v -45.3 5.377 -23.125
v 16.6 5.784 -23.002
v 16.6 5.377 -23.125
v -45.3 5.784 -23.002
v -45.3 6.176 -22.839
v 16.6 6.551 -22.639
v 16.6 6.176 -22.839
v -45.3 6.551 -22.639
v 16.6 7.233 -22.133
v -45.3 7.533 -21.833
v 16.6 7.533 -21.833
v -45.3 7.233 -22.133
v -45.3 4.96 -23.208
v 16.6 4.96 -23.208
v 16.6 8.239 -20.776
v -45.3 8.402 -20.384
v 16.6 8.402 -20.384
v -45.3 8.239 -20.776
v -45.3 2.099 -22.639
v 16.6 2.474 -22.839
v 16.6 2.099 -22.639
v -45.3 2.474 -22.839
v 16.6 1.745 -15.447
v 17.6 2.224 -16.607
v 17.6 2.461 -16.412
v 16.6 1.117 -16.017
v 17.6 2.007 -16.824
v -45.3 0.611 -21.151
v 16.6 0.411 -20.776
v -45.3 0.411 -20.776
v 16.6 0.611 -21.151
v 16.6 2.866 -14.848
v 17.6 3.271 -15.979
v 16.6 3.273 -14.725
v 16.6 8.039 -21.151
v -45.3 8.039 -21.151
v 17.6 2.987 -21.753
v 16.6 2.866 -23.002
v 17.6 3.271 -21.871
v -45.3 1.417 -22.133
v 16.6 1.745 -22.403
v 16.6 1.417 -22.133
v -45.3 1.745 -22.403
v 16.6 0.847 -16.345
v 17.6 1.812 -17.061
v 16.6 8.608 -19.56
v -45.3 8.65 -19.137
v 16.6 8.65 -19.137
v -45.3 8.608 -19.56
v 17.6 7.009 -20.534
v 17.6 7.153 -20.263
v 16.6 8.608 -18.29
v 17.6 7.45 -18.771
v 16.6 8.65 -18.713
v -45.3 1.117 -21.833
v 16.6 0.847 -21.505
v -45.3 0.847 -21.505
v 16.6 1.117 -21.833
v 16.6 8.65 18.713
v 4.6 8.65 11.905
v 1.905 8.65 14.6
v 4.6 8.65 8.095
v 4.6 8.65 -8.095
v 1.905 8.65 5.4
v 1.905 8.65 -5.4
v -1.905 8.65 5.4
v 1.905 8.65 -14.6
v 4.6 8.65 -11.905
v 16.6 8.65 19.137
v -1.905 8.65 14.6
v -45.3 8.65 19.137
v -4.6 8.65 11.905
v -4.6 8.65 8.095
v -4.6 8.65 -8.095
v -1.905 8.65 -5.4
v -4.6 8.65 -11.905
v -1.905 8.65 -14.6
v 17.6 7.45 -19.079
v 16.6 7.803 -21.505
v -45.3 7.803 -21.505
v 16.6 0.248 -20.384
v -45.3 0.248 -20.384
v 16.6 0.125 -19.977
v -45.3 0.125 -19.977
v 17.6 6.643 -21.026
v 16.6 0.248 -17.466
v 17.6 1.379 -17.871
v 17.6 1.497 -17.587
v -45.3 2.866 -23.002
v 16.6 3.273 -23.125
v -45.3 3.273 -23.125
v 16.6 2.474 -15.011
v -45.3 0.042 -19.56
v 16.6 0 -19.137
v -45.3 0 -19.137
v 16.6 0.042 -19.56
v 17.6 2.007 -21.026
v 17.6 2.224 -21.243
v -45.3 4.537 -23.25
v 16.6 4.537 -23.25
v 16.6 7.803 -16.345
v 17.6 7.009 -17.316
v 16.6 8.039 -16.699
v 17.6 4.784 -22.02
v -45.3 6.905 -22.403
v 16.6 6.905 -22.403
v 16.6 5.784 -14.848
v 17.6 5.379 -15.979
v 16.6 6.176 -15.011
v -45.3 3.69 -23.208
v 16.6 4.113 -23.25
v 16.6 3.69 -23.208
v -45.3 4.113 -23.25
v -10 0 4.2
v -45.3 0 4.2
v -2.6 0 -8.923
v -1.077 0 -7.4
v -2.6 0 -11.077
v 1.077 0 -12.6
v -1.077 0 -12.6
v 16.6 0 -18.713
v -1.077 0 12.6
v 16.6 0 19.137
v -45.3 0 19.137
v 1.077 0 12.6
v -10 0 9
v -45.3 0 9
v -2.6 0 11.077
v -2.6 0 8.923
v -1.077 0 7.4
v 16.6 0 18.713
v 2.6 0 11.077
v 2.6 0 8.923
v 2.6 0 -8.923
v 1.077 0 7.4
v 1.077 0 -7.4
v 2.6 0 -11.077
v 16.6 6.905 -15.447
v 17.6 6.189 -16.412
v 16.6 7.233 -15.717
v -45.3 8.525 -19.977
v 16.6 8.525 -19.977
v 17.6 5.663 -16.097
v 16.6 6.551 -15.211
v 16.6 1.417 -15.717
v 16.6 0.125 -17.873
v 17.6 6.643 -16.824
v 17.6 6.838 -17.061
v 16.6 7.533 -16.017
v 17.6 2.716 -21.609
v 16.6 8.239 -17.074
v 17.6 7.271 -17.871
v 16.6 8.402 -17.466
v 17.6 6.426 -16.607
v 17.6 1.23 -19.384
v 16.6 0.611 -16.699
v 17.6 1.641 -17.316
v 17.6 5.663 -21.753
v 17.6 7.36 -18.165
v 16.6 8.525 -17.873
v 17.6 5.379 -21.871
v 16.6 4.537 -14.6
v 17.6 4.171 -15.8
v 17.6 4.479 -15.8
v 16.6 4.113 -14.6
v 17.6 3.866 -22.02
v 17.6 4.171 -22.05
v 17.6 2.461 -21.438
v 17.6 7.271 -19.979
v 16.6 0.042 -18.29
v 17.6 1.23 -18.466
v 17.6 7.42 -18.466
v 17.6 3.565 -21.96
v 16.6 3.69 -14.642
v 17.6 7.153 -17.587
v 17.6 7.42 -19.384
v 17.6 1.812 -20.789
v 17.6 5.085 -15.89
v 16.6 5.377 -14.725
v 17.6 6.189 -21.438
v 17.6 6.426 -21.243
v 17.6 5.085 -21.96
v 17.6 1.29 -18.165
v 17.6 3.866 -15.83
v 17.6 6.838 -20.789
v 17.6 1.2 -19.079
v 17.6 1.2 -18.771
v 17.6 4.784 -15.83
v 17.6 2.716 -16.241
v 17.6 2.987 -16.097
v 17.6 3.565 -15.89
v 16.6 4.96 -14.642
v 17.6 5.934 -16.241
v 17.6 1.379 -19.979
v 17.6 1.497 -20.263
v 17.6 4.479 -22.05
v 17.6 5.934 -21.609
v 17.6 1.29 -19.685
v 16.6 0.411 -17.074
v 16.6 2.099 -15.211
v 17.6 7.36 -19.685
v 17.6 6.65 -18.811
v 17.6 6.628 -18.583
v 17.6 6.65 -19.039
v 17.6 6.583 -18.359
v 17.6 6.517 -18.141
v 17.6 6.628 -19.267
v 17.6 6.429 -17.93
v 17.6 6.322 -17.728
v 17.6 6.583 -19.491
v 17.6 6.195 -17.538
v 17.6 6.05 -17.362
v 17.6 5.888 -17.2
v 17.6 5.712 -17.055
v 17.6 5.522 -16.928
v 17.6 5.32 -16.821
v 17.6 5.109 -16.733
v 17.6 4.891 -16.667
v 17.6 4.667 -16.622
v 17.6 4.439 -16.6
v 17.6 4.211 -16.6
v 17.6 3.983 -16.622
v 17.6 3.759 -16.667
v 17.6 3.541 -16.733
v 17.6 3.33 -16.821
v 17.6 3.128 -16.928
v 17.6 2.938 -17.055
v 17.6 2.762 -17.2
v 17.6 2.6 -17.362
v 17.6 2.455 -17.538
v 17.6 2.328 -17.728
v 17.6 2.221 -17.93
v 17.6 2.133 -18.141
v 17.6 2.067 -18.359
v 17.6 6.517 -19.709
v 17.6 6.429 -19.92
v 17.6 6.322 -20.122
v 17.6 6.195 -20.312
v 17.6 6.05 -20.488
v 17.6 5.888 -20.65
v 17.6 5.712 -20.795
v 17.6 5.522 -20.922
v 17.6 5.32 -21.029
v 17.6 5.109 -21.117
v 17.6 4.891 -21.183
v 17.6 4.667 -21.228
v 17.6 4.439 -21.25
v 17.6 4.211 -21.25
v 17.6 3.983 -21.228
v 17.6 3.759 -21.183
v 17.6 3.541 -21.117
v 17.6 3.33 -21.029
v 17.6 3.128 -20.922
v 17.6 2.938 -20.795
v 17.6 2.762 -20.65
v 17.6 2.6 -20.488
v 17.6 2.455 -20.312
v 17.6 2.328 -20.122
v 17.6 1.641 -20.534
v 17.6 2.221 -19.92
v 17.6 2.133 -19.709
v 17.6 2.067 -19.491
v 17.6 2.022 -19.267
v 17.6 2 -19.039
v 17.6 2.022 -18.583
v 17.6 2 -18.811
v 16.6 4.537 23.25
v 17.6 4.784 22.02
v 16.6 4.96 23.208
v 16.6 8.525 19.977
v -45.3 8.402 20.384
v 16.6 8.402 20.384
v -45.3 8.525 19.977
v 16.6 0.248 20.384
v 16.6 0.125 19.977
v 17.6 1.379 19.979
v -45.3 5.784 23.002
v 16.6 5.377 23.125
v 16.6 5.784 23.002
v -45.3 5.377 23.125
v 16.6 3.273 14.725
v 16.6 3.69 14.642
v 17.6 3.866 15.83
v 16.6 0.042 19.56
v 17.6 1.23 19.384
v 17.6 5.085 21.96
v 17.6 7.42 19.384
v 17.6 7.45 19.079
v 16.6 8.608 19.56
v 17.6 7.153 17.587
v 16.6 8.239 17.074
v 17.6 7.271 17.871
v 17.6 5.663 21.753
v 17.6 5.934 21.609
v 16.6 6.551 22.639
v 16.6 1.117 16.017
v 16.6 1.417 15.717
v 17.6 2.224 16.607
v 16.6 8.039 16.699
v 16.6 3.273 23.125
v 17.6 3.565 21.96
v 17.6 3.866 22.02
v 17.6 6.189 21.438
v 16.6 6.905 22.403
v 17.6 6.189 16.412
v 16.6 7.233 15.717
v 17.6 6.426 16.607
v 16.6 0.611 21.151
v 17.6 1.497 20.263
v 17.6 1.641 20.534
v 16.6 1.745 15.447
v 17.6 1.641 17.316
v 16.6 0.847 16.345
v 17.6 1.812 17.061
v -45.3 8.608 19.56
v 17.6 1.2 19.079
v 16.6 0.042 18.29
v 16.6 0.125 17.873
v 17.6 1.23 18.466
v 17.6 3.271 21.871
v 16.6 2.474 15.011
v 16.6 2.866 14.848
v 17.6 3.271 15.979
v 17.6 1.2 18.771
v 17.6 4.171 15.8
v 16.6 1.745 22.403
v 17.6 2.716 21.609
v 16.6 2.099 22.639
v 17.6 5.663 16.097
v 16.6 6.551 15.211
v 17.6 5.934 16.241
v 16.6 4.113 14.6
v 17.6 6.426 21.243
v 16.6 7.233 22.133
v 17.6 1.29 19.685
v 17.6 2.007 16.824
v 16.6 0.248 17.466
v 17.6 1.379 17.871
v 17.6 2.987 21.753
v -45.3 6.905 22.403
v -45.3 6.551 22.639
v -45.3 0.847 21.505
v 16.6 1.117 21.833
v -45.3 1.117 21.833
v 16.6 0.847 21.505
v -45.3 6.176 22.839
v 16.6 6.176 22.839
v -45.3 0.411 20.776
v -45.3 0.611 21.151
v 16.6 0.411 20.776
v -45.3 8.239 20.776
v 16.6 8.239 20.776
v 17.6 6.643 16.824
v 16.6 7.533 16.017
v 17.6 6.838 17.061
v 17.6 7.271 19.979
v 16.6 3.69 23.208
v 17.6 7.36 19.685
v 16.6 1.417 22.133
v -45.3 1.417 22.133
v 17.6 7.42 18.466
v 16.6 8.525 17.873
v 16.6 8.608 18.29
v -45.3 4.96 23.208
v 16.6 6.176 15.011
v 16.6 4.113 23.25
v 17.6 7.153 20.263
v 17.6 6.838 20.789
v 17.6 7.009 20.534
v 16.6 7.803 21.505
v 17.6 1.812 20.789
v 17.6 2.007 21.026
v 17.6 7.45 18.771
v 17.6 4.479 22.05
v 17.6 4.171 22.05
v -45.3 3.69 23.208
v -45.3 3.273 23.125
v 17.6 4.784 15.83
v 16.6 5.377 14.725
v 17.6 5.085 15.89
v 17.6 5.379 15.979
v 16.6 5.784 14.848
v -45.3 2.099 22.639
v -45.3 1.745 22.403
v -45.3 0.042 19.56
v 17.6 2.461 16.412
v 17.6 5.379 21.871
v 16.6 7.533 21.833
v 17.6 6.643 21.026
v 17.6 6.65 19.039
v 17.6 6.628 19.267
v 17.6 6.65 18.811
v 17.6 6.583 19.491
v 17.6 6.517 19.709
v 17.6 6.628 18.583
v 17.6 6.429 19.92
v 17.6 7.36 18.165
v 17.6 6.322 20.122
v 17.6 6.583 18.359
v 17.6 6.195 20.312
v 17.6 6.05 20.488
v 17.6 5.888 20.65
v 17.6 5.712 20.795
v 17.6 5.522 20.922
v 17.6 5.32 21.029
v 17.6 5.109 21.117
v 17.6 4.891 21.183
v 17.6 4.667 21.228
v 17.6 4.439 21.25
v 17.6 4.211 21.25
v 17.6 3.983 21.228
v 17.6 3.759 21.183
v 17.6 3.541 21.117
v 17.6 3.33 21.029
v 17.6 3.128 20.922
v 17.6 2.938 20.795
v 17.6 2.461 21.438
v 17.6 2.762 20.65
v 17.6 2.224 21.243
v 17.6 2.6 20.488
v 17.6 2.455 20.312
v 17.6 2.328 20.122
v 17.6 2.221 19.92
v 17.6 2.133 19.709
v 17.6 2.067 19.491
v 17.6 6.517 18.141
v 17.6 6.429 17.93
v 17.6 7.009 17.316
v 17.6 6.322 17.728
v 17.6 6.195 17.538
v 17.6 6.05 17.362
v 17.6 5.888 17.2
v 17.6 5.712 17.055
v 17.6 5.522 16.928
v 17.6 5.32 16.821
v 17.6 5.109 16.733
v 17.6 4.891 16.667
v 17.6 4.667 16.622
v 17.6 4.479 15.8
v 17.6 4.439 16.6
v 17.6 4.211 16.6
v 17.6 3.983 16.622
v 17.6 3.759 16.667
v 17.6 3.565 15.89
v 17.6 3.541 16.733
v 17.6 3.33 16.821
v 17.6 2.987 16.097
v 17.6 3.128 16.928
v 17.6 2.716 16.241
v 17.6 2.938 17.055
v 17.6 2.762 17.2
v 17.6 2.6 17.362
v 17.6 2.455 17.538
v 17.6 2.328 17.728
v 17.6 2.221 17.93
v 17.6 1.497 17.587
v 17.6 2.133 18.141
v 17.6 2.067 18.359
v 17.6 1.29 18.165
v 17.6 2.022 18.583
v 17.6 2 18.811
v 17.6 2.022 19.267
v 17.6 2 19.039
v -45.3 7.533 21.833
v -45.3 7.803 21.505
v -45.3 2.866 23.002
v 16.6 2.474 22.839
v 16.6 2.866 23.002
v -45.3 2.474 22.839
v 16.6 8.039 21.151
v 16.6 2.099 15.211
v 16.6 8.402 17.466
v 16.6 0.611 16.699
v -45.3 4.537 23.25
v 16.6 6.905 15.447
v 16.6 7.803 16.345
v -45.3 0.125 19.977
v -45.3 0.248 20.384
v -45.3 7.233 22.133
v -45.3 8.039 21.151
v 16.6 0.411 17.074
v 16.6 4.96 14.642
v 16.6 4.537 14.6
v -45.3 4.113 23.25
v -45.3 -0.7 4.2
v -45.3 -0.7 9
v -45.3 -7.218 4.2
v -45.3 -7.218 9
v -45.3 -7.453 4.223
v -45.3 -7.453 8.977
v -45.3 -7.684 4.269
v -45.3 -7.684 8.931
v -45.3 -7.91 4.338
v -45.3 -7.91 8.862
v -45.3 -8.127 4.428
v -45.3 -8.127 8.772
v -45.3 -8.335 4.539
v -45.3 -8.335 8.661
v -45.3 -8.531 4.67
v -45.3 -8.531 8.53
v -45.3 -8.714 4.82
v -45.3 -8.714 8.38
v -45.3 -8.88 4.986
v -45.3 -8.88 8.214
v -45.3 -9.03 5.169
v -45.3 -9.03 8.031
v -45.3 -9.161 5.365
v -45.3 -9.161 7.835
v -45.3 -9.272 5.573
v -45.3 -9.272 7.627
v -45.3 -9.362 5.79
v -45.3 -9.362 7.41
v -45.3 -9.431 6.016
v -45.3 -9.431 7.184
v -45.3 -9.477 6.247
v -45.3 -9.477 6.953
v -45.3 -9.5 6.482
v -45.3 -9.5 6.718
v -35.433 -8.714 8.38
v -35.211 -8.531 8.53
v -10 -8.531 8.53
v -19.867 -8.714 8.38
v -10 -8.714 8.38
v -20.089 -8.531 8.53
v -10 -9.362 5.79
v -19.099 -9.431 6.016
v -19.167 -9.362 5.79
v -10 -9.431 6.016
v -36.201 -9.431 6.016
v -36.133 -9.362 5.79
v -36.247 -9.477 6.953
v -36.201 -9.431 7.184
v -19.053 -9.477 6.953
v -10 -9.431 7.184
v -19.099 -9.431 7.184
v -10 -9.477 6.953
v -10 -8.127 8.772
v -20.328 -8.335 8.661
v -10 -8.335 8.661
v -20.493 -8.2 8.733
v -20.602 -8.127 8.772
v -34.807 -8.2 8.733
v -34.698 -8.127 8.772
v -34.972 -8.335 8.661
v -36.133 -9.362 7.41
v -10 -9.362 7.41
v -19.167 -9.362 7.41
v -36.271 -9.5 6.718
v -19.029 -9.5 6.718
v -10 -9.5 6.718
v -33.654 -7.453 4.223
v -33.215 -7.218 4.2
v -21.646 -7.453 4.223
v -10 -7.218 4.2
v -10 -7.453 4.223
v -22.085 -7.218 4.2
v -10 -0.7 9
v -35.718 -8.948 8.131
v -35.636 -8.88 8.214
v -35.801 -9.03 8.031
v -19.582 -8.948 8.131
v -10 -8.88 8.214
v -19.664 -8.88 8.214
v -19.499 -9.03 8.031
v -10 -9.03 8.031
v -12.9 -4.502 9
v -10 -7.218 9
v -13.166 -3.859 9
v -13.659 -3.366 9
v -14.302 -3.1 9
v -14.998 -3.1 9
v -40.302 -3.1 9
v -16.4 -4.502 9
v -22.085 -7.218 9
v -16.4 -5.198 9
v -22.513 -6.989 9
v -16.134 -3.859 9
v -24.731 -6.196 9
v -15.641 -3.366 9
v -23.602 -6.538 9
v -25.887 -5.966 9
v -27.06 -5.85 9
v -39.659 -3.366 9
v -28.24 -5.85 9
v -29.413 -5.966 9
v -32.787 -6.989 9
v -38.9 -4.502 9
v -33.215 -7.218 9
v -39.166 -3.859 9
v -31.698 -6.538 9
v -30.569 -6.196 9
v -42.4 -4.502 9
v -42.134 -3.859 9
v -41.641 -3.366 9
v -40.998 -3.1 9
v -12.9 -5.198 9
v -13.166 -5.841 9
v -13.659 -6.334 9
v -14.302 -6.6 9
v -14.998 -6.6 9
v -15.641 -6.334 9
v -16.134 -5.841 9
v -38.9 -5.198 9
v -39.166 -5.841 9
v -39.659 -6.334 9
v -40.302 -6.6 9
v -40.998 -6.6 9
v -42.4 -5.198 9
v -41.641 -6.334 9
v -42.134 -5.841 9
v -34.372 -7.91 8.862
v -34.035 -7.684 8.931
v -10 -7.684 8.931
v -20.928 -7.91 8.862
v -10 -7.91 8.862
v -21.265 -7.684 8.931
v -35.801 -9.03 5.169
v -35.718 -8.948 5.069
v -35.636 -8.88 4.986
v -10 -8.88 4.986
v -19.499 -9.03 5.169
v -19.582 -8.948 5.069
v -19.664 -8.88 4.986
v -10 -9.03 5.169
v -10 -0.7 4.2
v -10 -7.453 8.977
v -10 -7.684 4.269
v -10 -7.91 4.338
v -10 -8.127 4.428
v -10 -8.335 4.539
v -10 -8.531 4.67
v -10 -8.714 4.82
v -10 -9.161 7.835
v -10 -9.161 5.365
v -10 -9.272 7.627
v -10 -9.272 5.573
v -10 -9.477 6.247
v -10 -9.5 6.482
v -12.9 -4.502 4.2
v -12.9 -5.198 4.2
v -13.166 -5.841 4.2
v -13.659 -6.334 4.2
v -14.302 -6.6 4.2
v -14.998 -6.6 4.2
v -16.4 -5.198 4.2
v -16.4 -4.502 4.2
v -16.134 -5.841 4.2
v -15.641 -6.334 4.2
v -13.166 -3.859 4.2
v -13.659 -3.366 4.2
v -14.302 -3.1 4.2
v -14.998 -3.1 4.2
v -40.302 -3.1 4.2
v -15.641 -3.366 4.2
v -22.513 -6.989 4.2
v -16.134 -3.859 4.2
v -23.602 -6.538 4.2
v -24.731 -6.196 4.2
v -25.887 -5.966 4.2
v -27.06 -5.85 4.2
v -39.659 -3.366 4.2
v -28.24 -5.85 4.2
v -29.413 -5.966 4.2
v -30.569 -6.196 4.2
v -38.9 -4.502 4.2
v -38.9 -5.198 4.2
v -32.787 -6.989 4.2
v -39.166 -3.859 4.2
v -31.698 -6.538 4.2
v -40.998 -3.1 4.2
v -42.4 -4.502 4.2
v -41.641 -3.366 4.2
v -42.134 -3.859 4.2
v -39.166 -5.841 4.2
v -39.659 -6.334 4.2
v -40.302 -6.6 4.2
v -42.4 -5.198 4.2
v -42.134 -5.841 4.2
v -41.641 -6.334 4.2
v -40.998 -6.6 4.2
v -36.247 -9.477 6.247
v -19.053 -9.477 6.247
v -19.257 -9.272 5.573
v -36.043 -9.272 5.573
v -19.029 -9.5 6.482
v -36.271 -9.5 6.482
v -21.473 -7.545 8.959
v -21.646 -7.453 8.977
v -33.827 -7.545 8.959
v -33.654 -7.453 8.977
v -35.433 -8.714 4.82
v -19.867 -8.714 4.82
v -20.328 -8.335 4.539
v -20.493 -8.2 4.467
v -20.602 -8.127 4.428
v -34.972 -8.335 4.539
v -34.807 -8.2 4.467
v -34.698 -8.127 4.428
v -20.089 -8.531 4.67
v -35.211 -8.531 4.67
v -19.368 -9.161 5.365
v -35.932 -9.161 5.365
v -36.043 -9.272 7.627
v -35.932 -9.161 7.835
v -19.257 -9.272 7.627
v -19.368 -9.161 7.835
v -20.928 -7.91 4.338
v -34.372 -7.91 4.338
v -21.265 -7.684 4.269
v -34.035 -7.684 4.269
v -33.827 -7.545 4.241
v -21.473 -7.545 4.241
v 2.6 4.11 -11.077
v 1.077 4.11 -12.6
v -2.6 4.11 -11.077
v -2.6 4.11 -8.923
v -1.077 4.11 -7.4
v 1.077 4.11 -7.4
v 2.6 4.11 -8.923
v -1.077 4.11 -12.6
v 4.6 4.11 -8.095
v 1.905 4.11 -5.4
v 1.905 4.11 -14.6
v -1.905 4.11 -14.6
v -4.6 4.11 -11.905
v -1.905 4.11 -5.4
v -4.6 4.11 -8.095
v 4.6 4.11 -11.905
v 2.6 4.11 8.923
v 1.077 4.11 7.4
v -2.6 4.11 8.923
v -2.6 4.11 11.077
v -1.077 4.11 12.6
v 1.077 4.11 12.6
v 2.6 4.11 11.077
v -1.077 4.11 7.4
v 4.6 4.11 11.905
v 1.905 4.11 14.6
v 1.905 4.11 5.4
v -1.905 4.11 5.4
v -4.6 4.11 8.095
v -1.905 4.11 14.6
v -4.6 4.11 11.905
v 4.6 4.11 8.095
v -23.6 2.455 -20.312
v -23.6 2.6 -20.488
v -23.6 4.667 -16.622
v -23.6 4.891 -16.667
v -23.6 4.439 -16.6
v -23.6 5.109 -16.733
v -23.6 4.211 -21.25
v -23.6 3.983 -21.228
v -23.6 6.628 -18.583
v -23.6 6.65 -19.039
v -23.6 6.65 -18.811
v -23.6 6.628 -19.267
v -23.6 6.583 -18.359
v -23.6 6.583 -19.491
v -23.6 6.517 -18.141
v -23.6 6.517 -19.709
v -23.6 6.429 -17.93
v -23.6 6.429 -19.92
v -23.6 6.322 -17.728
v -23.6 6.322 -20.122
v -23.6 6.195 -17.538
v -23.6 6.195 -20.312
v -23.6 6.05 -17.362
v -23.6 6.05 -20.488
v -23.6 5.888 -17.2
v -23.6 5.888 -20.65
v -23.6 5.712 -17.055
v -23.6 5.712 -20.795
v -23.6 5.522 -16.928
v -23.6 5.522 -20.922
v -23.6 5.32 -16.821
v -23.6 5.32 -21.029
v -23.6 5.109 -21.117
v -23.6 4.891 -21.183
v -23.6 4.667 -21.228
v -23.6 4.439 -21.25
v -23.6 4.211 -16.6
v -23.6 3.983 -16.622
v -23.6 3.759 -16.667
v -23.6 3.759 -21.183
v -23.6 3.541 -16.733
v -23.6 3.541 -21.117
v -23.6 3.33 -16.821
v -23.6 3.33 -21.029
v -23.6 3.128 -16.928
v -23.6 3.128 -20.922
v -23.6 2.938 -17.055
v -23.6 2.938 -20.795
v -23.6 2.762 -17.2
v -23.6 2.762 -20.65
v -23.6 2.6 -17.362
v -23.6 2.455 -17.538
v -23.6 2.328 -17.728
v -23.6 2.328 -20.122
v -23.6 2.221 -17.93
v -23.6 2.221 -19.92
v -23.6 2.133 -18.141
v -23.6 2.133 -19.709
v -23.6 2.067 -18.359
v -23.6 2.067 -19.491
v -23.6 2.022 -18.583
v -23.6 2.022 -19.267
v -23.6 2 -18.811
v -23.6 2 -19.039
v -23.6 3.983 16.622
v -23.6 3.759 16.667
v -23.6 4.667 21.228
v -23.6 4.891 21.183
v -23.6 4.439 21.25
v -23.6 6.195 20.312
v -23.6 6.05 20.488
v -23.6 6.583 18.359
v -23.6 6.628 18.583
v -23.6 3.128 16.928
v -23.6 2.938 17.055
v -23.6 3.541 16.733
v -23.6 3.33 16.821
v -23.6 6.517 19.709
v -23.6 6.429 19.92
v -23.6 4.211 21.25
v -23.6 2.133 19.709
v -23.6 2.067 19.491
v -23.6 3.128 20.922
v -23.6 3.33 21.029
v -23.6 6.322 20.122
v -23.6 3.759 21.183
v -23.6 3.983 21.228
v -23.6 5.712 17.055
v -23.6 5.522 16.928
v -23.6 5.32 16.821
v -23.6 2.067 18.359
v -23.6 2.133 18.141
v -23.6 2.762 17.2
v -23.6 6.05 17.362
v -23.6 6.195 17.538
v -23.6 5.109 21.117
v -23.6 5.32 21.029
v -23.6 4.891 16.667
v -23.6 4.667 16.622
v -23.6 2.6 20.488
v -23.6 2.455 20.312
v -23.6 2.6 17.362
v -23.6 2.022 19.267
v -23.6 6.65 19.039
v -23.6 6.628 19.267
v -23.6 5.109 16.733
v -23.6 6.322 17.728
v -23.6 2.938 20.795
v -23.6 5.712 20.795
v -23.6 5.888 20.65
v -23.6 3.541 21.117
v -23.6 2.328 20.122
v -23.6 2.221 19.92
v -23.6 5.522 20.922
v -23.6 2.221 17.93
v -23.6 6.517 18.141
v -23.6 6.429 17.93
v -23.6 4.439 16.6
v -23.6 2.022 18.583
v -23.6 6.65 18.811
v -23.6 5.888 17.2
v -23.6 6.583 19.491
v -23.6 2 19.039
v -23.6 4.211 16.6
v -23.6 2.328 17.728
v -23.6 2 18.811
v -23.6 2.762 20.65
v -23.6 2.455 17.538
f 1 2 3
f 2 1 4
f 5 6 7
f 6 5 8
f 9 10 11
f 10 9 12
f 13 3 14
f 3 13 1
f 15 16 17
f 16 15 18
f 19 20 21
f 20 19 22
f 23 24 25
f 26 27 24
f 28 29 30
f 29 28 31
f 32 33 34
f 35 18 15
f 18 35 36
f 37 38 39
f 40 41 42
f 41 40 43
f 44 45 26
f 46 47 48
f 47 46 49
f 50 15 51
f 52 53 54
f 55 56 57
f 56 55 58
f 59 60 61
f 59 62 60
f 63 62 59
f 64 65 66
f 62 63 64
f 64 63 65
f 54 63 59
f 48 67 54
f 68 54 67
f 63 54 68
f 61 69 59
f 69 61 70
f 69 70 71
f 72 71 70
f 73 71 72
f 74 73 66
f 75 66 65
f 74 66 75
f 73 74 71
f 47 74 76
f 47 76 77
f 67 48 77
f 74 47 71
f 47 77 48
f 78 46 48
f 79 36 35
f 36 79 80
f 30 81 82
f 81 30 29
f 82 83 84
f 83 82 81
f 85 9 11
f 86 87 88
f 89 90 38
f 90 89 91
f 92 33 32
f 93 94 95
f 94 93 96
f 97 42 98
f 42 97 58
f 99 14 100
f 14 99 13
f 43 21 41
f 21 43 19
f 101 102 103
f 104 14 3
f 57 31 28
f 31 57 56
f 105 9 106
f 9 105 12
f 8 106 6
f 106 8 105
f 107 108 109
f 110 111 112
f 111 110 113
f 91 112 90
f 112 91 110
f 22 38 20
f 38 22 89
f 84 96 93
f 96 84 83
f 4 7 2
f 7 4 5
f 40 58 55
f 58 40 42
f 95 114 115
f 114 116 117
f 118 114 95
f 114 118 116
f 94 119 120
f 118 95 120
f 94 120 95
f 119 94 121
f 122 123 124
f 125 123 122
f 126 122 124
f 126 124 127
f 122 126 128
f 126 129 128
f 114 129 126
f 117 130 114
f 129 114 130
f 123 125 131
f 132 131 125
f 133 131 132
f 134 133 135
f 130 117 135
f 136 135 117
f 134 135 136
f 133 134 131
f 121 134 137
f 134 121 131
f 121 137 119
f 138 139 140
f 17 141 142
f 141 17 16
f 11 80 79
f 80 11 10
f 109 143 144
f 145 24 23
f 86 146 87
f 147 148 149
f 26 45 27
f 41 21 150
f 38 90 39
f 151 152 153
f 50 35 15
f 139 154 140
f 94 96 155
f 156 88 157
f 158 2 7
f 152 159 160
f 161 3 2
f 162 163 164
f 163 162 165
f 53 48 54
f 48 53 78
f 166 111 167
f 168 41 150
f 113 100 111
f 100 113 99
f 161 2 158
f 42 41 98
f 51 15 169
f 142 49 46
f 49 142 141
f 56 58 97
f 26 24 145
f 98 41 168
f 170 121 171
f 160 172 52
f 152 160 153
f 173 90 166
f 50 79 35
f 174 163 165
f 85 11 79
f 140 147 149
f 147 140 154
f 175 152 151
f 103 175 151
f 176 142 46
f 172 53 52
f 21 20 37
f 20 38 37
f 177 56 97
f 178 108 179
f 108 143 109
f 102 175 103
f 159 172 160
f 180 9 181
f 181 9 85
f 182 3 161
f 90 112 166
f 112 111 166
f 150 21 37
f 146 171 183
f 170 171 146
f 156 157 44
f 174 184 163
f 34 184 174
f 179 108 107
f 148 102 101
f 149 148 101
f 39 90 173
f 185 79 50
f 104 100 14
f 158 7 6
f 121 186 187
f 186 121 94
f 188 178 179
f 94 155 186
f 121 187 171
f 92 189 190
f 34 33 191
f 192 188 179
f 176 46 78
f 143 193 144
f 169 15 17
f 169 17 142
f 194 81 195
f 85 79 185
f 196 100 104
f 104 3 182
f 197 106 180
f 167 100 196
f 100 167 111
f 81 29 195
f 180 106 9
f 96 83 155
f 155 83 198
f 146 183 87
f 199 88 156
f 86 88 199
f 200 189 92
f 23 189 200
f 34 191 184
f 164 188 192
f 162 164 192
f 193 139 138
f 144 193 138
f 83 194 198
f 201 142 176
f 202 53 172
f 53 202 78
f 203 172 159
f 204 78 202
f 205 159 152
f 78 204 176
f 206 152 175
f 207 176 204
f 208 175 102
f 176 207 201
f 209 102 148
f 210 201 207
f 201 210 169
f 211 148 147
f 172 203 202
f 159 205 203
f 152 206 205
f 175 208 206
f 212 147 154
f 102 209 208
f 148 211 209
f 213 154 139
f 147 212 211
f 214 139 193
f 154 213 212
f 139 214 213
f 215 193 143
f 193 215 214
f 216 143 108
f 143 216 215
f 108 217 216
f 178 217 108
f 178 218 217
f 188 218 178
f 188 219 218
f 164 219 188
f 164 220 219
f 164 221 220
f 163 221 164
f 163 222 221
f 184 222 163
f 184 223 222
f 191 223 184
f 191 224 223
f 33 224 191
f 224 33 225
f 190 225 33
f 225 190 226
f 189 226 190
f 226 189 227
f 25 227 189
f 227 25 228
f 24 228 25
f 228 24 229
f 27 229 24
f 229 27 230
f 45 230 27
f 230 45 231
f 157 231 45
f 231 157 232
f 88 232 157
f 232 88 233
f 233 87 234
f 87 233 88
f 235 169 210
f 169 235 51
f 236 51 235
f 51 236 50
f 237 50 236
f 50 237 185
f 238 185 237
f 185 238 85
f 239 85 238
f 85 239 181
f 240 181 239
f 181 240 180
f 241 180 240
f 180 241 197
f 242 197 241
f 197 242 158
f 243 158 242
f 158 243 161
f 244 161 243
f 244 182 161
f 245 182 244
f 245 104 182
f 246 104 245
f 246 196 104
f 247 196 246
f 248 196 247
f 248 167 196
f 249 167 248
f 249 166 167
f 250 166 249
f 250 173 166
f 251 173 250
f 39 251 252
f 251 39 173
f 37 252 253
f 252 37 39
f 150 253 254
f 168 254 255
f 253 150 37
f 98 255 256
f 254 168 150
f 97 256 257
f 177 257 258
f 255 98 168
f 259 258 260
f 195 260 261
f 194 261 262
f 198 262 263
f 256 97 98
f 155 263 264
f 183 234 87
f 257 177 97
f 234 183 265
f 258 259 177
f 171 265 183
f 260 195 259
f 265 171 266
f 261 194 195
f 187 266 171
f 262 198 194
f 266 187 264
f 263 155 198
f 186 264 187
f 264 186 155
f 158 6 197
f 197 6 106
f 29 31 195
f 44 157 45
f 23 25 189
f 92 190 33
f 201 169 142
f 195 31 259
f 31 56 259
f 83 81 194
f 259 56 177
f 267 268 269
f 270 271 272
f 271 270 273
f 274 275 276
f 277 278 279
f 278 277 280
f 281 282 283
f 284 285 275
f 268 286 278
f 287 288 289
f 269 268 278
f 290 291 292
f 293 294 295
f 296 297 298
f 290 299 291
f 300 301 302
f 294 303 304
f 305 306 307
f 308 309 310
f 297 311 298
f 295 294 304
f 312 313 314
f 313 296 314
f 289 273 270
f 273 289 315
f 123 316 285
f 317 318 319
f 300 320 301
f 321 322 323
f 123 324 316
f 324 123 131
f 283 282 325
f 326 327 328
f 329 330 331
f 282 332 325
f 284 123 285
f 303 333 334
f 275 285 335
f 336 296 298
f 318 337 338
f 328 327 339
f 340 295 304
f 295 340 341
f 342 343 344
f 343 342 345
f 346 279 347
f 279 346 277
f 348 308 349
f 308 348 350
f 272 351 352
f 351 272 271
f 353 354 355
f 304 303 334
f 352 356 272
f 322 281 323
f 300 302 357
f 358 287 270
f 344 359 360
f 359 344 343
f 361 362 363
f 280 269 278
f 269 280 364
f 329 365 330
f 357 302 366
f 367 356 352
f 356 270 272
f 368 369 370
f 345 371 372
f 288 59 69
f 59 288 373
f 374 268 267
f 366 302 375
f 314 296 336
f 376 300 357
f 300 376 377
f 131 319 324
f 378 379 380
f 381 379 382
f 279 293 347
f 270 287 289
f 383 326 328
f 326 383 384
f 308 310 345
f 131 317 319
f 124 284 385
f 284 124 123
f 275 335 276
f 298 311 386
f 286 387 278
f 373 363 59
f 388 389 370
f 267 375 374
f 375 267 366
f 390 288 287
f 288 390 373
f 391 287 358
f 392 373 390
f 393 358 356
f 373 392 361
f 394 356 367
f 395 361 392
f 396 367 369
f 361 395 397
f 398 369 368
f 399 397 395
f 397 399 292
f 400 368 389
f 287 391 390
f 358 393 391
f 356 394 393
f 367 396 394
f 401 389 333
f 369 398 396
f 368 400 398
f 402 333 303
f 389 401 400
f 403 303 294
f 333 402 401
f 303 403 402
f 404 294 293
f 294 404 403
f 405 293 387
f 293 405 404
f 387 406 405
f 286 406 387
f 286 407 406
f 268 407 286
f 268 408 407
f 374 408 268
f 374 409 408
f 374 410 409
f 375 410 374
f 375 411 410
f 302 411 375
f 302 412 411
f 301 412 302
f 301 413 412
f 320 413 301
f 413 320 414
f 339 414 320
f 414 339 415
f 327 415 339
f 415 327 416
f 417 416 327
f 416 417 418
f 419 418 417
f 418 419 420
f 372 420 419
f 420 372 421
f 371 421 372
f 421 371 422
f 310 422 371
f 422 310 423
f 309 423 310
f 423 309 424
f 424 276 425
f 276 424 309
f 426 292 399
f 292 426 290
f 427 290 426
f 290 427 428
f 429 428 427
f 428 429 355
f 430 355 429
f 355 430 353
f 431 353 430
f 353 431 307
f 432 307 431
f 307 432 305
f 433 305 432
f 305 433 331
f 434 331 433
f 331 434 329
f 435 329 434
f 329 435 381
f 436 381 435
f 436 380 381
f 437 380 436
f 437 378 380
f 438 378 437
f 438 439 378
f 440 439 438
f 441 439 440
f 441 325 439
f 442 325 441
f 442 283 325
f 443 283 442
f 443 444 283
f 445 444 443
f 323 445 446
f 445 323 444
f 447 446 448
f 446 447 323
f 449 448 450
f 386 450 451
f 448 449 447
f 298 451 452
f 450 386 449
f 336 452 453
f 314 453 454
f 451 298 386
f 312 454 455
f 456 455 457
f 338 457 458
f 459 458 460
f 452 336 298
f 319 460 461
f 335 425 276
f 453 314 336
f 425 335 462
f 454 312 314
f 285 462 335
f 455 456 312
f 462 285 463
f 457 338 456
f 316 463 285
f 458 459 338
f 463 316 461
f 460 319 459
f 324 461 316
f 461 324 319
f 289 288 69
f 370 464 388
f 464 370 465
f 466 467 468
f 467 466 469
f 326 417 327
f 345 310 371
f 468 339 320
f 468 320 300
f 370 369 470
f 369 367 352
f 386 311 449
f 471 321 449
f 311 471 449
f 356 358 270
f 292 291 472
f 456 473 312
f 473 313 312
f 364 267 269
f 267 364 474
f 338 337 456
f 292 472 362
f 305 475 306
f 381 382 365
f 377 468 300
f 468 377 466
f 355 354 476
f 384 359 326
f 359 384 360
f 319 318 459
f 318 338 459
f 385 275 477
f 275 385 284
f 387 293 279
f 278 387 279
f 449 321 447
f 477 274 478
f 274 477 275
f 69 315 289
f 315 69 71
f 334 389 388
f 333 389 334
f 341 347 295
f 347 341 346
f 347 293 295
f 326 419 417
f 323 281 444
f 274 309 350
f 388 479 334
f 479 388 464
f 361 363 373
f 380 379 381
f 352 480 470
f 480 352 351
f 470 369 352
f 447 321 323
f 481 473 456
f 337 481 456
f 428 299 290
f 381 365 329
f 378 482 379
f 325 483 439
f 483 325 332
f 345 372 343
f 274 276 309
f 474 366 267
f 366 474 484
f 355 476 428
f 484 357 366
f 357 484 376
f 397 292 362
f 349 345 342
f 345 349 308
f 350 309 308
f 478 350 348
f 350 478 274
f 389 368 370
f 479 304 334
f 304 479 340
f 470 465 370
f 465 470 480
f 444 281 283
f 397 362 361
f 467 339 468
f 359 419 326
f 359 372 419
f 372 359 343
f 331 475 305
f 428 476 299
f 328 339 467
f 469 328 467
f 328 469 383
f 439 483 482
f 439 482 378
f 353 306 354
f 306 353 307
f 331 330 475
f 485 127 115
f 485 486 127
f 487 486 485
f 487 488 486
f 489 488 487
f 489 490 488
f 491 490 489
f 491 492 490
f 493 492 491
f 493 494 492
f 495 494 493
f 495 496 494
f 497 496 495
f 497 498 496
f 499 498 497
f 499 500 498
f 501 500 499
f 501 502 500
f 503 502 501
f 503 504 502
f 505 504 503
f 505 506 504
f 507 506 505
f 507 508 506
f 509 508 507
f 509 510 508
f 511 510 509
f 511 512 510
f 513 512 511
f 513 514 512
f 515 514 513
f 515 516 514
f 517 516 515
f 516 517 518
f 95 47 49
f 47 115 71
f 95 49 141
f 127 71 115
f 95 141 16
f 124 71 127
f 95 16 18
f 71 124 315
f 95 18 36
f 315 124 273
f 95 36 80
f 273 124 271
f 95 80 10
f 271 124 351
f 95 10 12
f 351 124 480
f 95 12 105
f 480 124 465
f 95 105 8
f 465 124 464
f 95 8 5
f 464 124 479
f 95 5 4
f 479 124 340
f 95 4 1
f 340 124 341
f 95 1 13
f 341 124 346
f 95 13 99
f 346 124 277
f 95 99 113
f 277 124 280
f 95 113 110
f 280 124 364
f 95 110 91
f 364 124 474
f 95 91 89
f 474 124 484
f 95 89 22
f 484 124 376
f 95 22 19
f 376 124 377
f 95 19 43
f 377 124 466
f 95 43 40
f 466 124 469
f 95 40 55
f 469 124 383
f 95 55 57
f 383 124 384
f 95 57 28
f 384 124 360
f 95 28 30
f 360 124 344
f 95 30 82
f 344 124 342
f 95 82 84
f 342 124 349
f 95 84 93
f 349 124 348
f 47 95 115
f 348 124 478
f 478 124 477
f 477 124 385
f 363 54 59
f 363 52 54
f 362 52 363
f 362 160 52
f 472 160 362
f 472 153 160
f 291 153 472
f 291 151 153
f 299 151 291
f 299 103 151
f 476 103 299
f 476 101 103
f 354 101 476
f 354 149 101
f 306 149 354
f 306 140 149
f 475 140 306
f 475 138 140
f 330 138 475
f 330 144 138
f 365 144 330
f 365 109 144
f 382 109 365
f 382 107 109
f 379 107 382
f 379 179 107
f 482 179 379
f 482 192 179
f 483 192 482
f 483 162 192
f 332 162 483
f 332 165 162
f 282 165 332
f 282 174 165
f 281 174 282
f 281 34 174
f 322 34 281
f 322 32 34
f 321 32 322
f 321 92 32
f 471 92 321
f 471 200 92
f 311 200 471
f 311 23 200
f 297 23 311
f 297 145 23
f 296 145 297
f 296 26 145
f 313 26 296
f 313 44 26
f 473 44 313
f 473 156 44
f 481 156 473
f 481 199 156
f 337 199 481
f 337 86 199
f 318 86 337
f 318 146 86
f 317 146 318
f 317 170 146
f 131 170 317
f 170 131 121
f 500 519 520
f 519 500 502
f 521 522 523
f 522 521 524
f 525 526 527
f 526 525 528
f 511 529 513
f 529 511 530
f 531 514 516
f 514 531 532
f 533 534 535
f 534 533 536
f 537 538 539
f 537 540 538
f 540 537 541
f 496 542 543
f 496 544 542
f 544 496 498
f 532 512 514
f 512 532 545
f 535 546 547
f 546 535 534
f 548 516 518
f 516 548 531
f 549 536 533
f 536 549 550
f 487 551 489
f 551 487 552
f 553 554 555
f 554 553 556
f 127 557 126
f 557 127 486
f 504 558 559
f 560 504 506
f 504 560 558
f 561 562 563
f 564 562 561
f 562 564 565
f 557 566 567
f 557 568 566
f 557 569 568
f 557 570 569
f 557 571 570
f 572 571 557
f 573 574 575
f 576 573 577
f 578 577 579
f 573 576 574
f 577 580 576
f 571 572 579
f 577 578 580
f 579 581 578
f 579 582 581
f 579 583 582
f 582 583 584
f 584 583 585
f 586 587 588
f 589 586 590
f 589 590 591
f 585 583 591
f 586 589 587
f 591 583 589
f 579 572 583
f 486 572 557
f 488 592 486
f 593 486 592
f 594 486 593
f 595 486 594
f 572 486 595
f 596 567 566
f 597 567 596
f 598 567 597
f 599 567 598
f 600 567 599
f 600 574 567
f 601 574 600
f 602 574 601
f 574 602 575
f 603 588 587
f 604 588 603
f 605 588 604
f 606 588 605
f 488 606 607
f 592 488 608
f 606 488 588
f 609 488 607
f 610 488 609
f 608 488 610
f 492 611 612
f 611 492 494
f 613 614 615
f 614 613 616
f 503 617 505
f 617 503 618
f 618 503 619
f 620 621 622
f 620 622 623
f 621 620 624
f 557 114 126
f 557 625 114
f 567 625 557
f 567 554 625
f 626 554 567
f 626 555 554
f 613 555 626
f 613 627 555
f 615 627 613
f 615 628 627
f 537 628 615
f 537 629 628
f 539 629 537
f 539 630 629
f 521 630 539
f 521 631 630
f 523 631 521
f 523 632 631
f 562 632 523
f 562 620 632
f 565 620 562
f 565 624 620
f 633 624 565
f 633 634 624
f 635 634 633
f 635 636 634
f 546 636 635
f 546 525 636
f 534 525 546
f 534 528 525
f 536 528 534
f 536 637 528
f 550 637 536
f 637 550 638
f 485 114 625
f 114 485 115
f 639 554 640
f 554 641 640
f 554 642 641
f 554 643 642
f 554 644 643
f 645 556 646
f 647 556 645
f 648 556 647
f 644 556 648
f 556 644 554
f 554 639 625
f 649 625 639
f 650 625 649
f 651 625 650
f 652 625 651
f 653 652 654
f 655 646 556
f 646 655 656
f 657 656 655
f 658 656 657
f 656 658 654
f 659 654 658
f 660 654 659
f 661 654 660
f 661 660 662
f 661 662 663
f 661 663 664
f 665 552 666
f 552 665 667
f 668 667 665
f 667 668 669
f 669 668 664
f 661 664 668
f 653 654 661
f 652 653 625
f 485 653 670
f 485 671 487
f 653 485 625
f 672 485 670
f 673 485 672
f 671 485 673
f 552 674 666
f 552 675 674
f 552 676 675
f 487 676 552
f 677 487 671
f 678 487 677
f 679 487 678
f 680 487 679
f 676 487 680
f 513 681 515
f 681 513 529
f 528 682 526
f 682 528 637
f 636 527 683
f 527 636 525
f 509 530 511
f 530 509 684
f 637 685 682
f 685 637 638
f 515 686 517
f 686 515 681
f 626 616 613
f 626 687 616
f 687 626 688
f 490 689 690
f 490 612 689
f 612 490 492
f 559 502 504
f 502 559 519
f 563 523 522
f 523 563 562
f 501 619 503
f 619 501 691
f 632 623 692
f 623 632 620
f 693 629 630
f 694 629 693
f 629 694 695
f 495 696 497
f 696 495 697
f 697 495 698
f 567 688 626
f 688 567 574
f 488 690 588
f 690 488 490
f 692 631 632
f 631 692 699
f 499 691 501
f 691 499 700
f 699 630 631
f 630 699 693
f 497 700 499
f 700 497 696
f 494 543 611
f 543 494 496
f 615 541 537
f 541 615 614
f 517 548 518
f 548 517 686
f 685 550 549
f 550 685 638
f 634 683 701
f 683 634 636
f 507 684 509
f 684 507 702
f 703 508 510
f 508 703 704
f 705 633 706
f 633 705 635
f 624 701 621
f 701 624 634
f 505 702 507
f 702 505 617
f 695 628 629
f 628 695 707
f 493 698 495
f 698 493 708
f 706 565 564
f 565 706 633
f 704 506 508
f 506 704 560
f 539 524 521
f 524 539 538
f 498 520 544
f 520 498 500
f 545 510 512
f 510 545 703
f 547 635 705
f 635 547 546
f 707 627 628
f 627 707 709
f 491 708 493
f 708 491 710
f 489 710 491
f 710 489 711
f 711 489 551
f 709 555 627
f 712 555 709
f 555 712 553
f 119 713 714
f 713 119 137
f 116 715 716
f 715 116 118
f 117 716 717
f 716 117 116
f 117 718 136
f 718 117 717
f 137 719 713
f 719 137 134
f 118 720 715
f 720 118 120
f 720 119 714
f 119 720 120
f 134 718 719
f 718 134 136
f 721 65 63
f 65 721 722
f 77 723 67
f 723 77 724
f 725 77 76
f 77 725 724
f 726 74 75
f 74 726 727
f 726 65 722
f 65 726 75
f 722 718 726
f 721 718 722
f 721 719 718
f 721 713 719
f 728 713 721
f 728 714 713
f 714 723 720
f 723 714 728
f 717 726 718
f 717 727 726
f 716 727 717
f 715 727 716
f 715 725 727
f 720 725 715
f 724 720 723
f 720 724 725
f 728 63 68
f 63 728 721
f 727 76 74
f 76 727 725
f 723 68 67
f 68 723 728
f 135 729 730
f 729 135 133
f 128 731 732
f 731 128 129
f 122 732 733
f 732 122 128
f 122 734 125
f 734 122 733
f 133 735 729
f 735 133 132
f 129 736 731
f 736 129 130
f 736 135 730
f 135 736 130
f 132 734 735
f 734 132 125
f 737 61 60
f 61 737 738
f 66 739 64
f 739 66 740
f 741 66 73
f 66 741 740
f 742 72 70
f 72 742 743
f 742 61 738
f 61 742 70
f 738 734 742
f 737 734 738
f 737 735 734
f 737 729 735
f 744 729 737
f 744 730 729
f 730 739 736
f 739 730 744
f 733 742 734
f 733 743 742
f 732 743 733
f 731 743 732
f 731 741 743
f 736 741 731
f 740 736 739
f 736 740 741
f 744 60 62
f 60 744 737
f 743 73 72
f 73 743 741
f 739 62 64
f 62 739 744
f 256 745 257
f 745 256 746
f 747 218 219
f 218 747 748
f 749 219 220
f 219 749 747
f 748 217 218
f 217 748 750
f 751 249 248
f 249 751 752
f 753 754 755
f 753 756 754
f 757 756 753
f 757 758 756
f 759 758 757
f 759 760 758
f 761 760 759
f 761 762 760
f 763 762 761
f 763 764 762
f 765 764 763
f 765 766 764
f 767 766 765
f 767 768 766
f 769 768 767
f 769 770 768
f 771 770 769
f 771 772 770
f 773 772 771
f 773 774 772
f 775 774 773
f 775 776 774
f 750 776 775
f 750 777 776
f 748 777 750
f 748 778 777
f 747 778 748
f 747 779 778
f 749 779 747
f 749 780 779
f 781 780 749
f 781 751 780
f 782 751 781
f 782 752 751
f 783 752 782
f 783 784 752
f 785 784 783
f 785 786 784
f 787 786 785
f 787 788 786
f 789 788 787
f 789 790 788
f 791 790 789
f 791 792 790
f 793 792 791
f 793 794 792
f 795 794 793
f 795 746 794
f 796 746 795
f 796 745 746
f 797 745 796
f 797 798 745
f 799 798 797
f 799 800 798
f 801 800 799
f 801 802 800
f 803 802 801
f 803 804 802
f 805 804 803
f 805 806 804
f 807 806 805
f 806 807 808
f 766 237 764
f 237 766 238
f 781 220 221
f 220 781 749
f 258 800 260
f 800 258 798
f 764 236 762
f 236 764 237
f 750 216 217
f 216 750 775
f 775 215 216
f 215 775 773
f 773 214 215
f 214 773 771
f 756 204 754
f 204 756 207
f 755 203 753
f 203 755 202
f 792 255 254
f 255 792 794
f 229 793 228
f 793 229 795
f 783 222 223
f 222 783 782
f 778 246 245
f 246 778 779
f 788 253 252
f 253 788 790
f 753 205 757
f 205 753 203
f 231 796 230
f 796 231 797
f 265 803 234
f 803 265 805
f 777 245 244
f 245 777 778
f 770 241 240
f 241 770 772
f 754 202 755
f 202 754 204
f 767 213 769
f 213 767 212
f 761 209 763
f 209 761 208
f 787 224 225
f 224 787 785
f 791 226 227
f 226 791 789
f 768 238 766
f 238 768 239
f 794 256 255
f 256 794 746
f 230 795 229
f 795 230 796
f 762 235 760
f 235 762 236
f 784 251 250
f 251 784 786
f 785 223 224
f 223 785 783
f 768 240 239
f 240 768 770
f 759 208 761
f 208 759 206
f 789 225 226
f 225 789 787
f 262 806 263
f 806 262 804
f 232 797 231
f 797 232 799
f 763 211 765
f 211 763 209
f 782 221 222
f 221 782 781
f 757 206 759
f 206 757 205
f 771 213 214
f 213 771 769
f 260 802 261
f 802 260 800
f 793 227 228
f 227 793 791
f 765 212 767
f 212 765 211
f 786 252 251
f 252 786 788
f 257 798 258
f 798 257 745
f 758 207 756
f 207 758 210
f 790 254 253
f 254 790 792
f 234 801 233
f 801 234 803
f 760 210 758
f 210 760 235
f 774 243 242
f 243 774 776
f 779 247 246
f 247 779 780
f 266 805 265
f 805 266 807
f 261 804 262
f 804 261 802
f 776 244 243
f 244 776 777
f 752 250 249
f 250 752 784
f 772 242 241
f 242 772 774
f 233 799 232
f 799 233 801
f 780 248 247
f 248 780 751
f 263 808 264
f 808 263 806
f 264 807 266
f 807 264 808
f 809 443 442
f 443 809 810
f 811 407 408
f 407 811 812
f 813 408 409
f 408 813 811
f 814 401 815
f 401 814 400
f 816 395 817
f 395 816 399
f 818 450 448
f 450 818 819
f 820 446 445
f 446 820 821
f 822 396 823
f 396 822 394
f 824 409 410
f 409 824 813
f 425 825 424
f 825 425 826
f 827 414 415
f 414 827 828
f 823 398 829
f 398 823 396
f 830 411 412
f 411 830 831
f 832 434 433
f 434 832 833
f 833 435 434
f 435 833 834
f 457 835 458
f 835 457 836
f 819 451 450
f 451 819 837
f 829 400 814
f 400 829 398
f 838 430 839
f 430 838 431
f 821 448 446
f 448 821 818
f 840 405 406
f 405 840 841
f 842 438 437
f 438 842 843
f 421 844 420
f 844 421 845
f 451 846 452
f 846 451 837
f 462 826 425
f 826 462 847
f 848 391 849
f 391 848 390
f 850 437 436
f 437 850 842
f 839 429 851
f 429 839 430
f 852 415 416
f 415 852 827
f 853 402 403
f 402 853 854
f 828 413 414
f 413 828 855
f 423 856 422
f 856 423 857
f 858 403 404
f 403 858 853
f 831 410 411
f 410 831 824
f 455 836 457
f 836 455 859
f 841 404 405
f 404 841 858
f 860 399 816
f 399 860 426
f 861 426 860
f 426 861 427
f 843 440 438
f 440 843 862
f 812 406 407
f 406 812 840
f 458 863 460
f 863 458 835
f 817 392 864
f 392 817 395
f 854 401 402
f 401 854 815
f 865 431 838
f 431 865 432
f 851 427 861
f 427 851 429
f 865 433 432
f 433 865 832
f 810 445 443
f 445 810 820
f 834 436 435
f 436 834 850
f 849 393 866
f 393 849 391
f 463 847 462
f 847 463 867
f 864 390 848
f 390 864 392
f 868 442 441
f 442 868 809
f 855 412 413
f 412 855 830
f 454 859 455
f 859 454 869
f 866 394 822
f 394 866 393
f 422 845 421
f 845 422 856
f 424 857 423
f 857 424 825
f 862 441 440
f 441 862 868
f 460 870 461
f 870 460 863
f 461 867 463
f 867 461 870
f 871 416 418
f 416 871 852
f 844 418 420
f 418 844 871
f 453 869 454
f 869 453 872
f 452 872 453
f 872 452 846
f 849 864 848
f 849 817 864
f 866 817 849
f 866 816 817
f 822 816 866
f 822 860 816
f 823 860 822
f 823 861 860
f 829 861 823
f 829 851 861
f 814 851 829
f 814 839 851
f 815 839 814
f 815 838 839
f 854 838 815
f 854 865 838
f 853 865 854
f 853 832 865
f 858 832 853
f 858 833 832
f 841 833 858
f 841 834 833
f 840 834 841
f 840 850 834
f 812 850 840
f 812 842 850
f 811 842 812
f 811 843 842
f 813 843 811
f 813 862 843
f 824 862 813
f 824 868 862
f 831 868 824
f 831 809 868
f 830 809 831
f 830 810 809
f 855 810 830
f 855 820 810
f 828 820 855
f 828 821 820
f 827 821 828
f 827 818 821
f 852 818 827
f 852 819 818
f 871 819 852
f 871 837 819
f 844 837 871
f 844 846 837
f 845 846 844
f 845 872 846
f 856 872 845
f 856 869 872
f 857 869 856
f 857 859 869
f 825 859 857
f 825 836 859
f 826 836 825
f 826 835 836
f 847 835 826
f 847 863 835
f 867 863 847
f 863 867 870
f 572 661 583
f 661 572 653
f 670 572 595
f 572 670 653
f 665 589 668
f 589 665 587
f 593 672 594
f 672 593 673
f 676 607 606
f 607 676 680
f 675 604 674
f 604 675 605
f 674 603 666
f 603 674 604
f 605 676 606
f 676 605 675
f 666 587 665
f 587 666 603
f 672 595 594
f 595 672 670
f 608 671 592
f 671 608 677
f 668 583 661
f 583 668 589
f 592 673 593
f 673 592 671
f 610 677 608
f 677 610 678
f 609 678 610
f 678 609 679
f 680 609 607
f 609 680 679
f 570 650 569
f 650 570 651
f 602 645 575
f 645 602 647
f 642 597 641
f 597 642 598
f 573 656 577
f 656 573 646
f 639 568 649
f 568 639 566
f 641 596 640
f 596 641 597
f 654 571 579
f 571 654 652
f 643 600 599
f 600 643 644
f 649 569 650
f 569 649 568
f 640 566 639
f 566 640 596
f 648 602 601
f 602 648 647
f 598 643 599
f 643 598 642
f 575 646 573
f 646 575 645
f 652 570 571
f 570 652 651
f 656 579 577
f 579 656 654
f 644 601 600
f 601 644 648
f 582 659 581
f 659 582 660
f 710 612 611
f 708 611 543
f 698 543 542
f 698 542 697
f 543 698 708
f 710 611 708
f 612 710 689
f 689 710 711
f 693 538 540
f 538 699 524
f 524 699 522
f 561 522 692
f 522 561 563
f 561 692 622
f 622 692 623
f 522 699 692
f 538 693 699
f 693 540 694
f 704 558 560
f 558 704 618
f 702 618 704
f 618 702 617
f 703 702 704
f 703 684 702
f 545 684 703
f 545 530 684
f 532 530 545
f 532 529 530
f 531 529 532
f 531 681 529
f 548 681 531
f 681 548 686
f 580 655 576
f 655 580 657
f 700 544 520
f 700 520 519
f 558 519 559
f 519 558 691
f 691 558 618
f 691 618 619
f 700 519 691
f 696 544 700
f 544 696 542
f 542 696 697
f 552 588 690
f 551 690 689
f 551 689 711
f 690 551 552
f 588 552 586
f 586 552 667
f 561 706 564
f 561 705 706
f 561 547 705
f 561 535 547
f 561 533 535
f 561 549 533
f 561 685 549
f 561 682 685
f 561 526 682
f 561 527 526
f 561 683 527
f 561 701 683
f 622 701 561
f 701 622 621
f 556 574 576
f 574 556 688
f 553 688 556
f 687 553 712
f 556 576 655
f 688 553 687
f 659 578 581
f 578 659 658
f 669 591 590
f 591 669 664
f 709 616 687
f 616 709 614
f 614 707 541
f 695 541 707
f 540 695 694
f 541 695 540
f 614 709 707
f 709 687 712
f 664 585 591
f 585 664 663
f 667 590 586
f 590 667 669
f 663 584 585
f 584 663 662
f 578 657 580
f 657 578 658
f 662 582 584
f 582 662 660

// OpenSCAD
use <../sketch-for-simpler.scad>;

rotate([0,-90,0]) {
  y_endcap();
}
